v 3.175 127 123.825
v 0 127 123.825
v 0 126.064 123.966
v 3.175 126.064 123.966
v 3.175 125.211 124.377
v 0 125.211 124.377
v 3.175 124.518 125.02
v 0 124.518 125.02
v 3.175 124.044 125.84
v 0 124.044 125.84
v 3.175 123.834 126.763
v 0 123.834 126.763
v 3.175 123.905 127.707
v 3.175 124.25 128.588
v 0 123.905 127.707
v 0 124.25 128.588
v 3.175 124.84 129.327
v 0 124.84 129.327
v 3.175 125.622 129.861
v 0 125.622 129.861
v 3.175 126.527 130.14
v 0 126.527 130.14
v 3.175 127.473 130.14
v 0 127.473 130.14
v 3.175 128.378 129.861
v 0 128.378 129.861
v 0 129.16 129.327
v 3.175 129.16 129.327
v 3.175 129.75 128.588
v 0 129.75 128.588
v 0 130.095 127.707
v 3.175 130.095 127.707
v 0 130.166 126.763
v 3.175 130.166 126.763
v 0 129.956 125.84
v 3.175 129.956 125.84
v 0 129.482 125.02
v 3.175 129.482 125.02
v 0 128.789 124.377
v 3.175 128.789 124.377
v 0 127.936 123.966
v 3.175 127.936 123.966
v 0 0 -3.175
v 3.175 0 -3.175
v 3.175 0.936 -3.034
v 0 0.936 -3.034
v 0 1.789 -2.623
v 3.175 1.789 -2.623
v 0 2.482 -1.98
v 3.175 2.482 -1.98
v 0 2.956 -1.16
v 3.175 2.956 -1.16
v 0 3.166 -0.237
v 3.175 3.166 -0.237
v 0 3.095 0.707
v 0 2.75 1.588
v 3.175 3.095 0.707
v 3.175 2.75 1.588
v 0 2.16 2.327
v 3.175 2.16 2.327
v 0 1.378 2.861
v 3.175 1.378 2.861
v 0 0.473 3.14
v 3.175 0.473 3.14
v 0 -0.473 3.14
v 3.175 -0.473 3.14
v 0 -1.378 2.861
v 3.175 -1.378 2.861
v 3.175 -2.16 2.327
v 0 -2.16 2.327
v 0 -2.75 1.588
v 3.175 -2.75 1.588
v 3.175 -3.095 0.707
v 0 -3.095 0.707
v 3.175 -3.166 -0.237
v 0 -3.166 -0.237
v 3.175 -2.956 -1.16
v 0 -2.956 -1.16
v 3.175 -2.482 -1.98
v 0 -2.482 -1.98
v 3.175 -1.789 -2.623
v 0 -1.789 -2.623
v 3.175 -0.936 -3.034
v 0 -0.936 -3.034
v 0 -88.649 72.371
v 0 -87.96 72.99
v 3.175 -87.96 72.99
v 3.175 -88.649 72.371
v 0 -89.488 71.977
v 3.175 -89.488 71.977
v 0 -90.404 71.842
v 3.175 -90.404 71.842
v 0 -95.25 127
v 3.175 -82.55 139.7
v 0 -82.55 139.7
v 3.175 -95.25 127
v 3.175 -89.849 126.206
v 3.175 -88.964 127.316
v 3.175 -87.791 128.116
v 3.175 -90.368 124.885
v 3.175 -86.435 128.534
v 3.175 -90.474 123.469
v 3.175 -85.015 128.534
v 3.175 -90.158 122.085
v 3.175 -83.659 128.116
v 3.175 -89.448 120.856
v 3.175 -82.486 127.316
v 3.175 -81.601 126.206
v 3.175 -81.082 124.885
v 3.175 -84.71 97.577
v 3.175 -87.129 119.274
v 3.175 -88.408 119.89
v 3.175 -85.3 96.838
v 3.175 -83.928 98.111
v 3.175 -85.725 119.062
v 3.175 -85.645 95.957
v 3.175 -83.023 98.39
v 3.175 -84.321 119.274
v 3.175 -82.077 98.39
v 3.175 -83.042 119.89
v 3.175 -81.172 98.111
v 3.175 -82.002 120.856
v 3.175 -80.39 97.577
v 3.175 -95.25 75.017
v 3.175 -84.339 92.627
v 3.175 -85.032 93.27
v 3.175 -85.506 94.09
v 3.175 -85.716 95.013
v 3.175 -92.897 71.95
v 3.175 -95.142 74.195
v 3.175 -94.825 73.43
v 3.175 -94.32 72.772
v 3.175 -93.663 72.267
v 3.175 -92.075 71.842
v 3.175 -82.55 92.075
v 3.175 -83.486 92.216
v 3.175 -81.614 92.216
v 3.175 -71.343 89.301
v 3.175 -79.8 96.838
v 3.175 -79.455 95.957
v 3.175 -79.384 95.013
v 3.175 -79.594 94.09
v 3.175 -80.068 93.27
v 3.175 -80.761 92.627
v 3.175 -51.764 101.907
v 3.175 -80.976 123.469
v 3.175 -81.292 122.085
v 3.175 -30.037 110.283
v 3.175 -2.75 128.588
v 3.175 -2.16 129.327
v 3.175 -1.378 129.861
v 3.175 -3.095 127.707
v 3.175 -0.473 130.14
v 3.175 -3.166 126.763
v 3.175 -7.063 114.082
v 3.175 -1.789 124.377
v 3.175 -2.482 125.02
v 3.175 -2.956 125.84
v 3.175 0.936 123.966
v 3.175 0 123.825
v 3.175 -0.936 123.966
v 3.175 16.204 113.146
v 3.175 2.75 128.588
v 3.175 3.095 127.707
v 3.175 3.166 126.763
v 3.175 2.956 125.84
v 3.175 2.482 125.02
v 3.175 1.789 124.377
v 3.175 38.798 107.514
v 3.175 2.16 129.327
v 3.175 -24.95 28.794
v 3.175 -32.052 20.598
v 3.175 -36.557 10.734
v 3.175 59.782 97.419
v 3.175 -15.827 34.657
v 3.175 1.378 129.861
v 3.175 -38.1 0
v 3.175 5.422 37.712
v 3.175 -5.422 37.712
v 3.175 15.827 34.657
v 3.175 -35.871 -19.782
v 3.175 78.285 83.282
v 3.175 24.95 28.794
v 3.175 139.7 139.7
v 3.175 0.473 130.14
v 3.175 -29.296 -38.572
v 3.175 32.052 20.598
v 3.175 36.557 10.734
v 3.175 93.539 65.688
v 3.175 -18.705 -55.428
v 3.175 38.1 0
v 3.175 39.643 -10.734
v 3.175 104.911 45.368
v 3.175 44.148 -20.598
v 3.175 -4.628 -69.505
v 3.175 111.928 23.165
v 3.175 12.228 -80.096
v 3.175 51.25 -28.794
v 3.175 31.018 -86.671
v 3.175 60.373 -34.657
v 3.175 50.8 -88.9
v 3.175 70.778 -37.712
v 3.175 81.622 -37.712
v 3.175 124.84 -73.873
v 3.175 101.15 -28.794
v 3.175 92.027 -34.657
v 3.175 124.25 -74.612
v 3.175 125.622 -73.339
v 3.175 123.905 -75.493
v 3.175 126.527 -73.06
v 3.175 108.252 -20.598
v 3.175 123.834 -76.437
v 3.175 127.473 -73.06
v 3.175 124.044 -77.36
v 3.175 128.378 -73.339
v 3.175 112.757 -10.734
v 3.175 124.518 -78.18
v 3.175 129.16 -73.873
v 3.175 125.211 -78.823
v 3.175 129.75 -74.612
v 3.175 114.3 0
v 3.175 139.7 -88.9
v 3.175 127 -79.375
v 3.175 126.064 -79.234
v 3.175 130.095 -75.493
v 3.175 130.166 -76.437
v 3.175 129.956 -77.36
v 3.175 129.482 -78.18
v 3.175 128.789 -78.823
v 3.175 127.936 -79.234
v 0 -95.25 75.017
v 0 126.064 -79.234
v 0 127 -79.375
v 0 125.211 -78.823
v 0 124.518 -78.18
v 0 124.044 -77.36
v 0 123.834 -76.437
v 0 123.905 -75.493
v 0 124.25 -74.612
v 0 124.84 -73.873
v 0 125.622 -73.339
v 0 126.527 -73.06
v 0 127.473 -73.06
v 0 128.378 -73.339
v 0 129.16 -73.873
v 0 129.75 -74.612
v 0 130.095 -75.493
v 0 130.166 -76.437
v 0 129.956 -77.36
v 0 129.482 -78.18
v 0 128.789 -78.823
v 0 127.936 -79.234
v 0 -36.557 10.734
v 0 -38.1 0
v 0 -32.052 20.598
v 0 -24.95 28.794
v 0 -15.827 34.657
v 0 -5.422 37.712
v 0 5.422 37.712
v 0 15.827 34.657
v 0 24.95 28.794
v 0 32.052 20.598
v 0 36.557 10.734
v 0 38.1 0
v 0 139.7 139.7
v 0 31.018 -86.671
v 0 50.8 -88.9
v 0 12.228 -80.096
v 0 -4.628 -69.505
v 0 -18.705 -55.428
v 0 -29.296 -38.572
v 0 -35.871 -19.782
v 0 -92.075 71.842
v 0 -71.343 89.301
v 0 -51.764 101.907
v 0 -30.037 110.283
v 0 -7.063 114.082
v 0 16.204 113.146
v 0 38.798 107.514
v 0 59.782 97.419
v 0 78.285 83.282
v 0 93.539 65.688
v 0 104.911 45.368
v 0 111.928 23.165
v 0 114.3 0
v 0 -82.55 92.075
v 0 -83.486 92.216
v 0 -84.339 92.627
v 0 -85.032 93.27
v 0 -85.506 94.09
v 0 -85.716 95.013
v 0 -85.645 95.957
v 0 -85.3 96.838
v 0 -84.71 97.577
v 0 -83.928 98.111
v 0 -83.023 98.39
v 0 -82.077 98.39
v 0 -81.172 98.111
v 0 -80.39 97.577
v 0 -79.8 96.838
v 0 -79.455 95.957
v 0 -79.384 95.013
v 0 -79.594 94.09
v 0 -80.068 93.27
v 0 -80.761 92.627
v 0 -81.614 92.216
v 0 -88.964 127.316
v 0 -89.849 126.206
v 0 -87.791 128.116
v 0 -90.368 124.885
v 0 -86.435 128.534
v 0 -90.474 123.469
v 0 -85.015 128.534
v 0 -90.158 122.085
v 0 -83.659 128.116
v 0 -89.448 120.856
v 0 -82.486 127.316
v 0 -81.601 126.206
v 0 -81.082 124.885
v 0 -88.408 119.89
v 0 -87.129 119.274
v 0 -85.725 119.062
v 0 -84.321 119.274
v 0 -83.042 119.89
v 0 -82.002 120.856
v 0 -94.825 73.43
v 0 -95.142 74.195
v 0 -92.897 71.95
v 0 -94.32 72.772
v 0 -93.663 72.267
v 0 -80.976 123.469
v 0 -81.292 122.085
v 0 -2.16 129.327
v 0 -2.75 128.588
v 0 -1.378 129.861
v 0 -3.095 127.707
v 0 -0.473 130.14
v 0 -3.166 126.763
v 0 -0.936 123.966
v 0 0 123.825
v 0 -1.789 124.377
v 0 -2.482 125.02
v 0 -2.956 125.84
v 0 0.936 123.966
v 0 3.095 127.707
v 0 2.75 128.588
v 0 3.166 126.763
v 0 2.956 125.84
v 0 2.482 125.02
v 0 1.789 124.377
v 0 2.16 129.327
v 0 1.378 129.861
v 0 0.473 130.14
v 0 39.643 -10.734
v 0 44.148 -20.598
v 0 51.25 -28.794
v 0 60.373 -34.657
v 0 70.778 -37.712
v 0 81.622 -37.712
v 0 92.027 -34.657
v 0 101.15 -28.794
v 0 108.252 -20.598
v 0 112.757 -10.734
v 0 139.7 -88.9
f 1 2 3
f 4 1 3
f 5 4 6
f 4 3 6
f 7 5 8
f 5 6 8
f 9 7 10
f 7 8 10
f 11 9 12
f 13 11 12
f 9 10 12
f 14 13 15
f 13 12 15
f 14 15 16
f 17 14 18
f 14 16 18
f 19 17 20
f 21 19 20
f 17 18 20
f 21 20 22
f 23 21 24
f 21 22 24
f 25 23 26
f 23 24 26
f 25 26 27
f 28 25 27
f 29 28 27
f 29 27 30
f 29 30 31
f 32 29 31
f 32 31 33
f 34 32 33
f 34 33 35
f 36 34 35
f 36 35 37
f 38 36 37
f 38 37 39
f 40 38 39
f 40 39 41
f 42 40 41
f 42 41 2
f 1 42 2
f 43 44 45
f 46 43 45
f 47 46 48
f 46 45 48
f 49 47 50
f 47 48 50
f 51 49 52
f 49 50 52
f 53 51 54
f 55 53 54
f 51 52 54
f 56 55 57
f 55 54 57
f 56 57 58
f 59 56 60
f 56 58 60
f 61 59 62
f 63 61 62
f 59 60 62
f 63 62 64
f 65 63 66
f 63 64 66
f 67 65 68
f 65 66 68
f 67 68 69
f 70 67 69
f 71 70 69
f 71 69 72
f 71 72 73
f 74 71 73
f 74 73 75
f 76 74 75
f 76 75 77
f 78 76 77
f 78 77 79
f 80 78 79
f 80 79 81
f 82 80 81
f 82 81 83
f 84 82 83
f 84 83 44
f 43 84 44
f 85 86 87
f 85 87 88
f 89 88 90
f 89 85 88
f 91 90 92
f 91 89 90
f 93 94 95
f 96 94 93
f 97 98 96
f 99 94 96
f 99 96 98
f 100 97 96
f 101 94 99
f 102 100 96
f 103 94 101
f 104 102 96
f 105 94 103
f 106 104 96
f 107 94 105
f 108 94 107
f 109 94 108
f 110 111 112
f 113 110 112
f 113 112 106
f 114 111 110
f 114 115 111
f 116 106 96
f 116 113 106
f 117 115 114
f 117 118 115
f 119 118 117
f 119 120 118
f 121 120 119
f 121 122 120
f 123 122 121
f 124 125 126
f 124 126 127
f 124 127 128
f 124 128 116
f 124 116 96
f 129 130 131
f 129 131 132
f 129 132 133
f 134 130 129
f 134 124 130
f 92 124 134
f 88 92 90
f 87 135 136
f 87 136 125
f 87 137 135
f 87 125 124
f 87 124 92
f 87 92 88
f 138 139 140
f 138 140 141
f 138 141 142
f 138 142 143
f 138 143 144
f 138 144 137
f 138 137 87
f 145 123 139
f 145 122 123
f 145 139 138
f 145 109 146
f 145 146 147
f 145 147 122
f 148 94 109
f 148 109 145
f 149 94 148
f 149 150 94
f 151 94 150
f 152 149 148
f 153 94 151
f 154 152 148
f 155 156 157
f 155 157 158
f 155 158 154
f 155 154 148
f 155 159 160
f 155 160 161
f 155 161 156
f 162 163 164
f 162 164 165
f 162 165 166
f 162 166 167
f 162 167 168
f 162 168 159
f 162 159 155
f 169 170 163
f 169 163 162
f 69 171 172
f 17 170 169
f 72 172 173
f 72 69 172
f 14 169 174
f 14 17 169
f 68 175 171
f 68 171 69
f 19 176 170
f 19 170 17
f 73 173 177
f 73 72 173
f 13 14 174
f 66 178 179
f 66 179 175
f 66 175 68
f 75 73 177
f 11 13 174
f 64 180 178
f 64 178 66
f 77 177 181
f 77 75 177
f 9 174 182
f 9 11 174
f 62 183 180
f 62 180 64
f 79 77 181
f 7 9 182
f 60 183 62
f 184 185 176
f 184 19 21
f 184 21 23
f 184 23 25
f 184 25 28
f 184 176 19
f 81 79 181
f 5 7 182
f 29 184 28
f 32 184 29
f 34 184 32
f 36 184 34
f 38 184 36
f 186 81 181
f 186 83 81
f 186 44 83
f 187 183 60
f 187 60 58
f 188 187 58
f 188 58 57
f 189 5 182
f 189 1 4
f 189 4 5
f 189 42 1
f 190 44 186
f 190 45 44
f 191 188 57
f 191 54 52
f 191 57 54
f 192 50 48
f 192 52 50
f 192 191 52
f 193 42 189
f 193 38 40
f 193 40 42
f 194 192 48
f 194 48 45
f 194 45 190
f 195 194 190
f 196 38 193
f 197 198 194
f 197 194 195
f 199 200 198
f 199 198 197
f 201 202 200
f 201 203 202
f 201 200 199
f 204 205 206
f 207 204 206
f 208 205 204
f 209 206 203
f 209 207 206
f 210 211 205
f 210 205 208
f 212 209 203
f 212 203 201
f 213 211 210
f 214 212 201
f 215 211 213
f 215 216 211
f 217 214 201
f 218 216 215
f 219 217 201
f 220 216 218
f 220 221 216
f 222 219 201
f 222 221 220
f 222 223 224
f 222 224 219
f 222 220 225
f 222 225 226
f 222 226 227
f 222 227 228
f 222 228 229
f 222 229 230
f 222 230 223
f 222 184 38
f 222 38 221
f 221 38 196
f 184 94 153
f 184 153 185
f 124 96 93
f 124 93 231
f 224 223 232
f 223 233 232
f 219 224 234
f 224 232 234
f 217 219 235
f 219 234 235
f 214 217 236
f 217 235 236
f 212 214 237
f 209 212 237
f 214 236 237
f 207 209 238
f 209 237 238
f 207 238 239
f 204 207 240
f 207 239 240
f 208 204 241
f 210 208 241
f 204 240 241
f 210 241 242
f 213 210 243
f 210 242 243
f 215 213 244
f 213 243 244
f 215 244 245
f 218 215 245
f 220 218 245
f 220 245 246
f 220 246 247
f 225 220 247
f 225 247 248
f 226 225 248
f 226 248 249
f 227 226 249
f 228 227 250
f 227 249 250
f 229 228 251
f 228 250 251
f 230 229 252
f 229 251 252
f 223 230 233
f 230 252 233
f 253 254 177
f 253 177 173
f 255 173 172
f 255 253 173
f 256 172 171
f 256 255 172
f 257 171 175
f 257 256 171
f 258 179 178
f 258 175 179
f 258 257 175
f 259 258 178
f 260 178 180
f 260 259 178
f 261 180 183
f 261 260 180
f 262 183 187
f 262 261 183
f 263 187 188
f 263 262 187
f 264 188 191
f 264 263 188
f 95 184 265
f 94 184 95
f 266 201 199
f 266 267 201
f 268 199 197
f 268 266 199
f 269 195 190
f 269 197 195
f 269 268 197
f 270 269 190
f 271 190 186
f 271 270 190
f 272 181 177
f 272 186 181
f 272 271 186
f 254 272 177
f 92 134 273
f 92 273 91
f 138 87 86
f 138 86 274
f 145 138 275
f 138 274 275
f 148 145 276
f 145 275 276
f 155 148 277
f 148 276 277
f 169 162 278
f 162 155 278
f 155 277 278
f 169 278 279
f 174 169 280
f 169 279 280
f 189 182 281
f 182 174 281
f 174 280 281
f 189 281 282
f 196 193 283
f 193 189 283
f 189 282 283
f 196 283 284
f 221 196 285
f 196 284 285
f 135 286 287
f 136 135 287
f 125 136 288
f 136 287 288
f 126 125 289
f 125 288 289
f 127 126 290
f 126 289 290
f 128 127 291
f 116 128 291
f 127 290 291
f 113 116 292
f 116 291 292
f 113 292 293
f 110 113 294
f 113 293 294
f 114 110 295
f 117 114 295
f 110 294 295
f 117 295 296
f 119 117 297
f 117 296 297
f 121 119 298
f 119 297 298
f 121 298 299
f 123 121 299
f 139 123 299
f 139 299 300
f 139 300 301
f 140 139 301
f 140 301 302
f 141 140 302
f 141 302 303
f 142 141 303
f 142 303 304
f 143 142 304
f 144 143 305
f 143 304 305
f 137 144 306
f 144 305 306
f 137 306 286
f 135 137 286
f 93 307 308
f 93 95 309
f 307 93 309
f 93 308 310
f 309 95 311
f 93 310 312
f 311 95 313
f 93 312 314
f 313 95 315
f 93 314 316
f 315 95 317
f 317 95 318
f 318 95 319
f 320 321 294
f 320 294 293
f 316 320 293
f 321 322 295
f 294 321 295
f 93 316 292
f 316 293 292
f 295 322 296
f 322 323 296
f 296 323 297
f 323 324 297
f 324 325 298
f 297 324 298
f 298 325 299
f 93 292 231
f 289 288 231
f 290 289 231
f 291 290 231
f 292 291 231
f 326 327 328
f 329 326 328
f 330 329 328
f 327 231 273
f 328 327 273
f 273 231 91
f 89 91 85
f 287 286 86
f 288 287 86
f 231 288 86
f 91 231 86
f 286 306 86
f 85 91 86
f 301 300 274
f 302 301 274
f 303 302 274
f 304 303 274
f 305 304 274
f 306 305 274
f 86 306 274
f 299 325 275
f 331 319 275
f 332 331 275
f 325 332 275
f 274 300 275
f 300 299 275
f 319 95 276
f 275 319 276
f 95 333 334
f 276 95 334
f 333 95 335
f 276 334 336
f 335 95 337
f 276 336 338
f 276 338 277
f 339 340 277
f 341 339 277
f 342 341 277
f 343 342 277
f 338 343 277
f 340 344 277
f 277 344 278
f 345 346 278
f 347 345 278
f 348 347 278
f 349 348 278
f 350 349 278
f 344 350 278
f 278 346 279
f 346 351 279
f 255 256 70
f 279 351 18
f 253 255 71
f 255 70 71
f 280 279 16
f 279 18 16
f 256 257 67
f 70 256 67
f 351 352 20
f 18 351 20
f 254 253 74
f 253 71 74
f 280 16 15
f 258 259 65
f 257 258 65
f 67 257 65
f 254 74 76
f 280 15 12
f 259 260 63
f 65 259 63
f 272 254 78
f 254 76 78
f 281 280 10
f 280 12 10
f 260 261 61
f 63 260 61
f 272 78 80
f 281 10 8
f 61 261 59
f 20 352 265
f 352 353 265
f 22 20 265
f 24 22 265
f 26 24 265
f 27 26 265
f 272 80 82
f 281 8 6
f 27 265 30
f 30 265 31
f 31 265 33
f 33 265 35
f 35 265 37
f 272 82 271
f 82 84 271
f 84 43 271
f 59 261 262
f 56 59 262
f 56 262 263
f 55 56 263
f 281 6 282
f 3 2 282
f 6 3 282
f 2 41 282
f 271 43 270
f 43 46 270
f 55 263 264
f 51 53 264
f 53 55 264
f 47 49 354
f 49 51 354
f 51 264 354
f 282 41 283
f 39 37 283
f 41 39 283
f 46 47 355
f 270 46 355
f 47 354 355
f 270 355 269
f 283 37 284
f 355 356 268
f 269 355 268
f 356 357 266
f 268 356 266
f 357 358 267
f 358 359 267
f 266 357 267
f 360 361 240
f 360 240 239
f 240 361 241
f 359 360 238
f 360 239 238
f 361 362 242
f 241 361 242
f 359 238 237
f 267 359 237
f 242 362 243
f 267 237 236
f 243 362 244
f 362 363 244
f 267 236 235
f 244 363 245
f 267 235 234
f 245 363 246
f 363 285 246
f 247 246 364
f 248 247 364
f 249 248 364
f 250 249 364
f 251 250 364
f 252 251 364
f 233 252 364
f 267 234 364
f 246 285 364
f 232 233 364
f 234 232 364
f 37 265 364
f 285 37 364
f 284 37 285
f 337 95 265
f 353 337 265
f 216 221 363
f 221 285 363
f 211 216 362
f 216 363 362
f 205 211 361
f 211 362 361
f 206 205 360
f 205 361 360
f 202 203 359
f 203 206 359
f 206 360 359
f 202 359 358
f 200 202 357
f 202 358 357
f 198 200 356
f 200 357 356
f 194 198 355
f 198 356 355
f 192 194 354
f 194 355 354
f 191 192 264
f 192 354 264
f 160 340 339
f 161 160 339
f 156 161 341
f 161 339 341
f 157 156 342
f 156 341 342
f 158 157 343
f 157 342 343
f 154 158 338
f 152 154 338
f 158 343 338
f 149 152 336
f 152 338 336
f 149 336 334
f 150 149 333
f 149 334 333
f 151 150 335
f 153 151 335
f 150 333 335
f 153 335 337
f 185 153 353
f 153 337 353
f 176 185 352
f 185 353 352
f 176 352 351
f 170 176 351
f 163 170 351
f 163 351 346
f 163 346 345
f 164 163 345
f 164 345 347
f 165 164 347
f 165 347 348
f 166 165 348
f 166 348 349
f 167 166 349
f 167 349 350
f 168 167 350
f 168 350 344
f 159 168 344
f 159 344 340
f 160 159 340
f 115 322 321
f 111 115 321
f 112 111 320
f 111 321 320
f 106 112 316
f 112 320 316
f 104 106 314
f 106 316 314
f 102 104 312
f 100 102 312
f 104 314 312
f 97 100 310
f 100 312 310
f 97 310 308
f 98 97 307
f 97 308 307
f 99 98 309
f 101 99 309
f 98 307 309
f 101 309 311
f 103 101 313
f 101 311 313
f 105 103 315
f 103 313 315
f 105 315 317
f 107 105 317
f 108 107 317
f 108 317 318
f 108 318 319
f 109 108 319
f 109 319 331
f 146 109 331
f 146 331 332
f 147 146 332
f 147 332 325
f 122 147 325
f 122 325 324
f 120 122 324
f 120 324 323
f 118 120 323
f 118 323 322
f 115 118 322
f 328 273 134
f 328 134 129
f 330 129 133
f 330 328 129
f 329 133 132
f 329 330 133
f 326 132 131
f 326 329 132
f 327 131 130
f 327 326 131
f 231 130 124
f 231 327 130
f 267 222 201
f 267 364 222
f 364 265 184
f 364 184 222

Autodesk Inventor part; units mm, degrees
ref_plane "YZ Plane" through (0, 0, 0) normal (1, 0, 0) x (0, 1, 0)
ref_plane "XZ Plane" through (0, 0, 0) normal (0, 1, 0) x (-1, 0, 0)
ref_plane "XY Plane" through (0, 0, 0) normal (0, 0, 1) x (1, 0, 0)
sketch "Sketch1" plane through (0, 0, 0) normal (1, 0, 0) x (0, 1, 0)
  circle A0 centre (0, 0) radius 50.8 construction
  circle A1 centre (82.55, 0) radius 31.75 construction
  circle A2 centre (-82.55, 0) radius 31.75 construction
  circle A3 centre (0, 0) radius 114.3 construction
  circle A4 centre (0, 0) radius 38.1 construction
  arc A5 (38.1, 0) -> (114.3, 0) centre (76.2, 0) ccw construction
  arc A6 (-38.1, 0) -> (139.7, 0) centre (50.8, 0) ccw construction
  line L0 (50.8, -88.9) -> (139.7, -88.9) construction
  line L1 (139.7, -88.9) -> (139.7, 0) construction
  line L2 (139.7, 0) -> (-101.6, 0) construction
  line L3 (-101.6, 0) -> (-101.6, 139.7) construction
  line L4 (-101.6, 139.7) -> (139.7, 139.7) construction
  line L5 (139.7, 139.7) -> (139.7, 0) construction
  arc A7 (11.0716, 139.7) -> (-101.6, 96.52) centre (0, 0) ccw construction
  line L6 (-101.6, 139.7) -> (-101.6, 63.1817) construction
  line L7 (-101.6, 63.1817) -> (-95.25, 63.1817) construction
  arc A8 (-11.0716, 139.7) -> (-101.6, 96.52) centre (0, 0) ccw
  line L8 (-11.0716, 139.7) -> (139.7, 139.7)
  line L9 (139.7, 139.7) -> (139.7, -88.9)
  line L10 (139.7, -88.9) -> (50.8, -88.9)
  arc A9 (-38.1, 0) -> (50.8, -88.9) centre (50.8, 0) ccw
  arc A10 (38.1, 0) -> (-38.1, 0) centre (0, 0) ccw
  arc A11 (38.1, 0) -> (114.3, 0) centre (76.2, 0) ccw
  arc A12 (114.3, 0) -> (-95.25, 63.1817) centre (0, 0) ccw
  line L11 (-95.25, 63.1817) -> (-101.6, 63.1817)
  line L12 (-101.6, 96.52) -> (-101.6, 63.1817)
  dimension "d1" = 63.5
  dimension "d0" = 101.6
  dimension "d2" = 63.5
  dimension "d3" = 82.55
  dimension "d4" = 82.55
  dimension "d5" = 0
  dimension "d6" = 0
  dimension "d7" = 228.6
  dimension "d8" = 76.2
  dimension "d9" = 76.2
  dimension "d10" = 177.8
  dimension "d11" = 88.9
  dimension "d12" = 139.7
  dimension "d13" = 0
  dimension "d14" = 241.3
  dimension "d15" = 139.7
  dimension "d16" = 0
  dimension "d76" = 6.35
  dimension "d77" = 43.18
extrude "Extrusion1" add sketch "Sketch1" along normal blind 3.175
sketch "Sketch2" plane through (3.175, 0, 0) normal (1, 0, 0) x (0, 0, -1)
  arc A0 (0, 38.1) -> (0, -38.1) centre (0, 0) ccw projected
  arc A1 (0, -38.1) -> (88.9, 50.8) centre (0, 50.8) ccw projected
  line L0 (88.9, 50.8) -> (88.9, 139.7) projected
  line L1 (88.9, 139.7) -> (-139.7, 139.7) projected
  line L2 (-139.7, 139.7) -> (-139.7, -11.0716) projected
  arc A2 (-139.7, -11.0716) -> (-96.52, -101.6) centre (0, 0) ccw projected
  line L3 (-96.52, -101.6) -> (-63.1817, -101.6) projected
  line L4 (-63.1817, -101.6) -> (-63.1817, -95.25) projected
  arc A3 (0, 114.3) -> (-63.1817, -95.25) centre (0, 0) ccw projected
  arc A4 (0, 38.1) -> (0, 114.3) centre (0, 76.2) ccw projected
  line L5 (-63.1817, -101.6) -> (-139.3817, -101.6)
  line L6 (-139.3817, -101.6) -> (-139.3817, -95.25)
  line L7 (-139.3817, -95.25) -> (-63.1817, -95.25)
  line L8 (-63.1817, -95.25) -> (-63.1817, -101.6)
  arc A5 (0, 114.3) -> (-63.1817, -95.25) centre (0, 0) ccw projected
  line L9 (-63.1817, -101.6) -> (-71.842, -101.6)
  line L10 (-71.842, -101.6) -> (-71.842, -88.9)
  line L11 (-71.842, -88.9) -> (-63.1817, -88.9)
  line L12 (-63.1817, -88.9) -> (-63.1817, -101.6)
  point P0 (0, 0)
  dimension "d24" = 76.2
  dimension "d25" = 6.35
  dimension "d26" = 12.7
extrude "Extrusion2" cut sketch "Sketch2" against normal blind 3.175 contours L11 L12 A3 | A3 L7 L10 | L4 L3 L10 L7 | L10 L3 A2 L7 | A2 L5 L6 L7
sketch "Sketch3" plane through (3.175, 0, 0) normal (1, 0, 0) x (0, 0, -1)
  line L0 (-102.7916, -95.25) -> (-71.842, -95.25) projected
  line L1 (-71.842, -95.25) -> (-71.842, -88.9) projected
  arc A0 (0, 114.3) -> (-71.842, -88.9) centre (0, 0) ccw projected
  arc A1 (0, 38.1) -> (0, 114.3) centre (0, 76.2) ccw projected
  arc A2 (0, 38.1) -> (0, -38.1) centre (0, 0) ccw projected
  arc A3 (0, -38.1) -> (88.9, 50.8) centre (0, 50.8) ccw projected
  line L2 (88.9, 50.8) -> (88.9, 139.7) projected
  line L3 (88.9, 139.7) -> (-139.7, 139.7) projected
  line L4 (-139.7, 139.7) -> (-139.7, -11.0716) projected
  arc A4 (-139.7, -11.0716) -> (-102.7916, -95.25) centre (0, 0) ccw projected
  point P0 (0, 0)
  point P1 (-127, 127)
  point P2 (76.2, 127)
  point P3 (-95.25, -82.55)
  point P4 (-127, 0)
  dimension "d29" = 12.7
  dimension "d30" = 12.7
  dimension "d31" = 12.7
  dimension "d32" = 12.7
  dimension "d33" = 12.7
  dimension "d34" = 139.7
  dimension "d35" = 95.25
  dimension "d36" = 82.55
hole "Hole1" at (3.175, 127, 127) at (3.175, 127, -76.2) at (3.175, -82.55, 95.25) at (3.175, 0, 127) direction (-1, 0, 0) diameter 6.35 end through all
sketch "Sketch4" plane through (3.175, 0, 0) normal (1, 0, 0) x (0, 0, -1)
  circle A0 centre (-95.25, -82.55) radius 3.175 projected
  circle A1 centre (-127, 127) radius 3.175 projected
  circle A2 centre (76.2, 127) radius 3.175 projected
  circle A3 centre (-127, 0) radius 3.175 projected
  line L0 (-102.7916, -95.25) -> (-71.842, -95.25) projected
  line L1 (-71.842, -95.25) -> (-71.842, -88.9) projected
  arc A4 (0, 114.3) -> (-71.842, -88.9) centre (0, 0) ccw projected
  arc A5 (0, 38.1) -> (0, 114.3) centre (0, 76.2) ccw projected
  arc A6 (0, 38.1) -> (0, -38.1) centre (0, 0) ccw projected
  arc A7 (0, -38.1) -> (88.9, 50.8) centre (0, 50.8) ccw projected
  line L2 (88.9, 50.8) -> (88.9, 139.7) projected
  line L3 (88.9, 139.7) -> (-139.7, 139.7) projected
  line L4 (-139.7, 139.7) -> (-139.7, -11.0716) projected
  arc A8 (-139.7, -11.0716) -> (-102.7916, -95.25) centre (0, 0) ccw projected
  circle A9 centre (0, 0) radius 3.175
  point P0 (0, 0)
  dimension "d55" = 6.35
sketch "Sketch5" plane through (3.175, 0, 0) normal (1, 0, 0) x (0, 0, -1)
  circle A0 centre (-95.25, -82.55) radius 3.175 projected
  circle A1 centre (-127, 127) radius 3.175 projected
  circle A2 centre (76.2, 127) radius 3.175 projected
  circle A3 centre (-127, 0) radius 3.175 projected
  line L0 (-102.7916, -95.25) -> (-71.842, -95.25) projected
  line L1 (-71.842, -95.25) -> (-71.842, -88.9) projected
  arc A4 (0, 114.3) -> (-71.842, -88.9) centre (0, 0) ccw projected
  arc A5 (0, 38.1) -> (0, 114.3) centre (0, 76.2) ccw projected
  arc A6 (0, 38.1) -> (0, -38.1) centre (0, 0) ccw projected
  arc A7 (0, -38.1) -> (88.9, 50.8) centre (0, 50.8) ccw projected
  line L2 (88.9, 50.8) -> (88.9, 139.7) projected
  line L3 (88.9, 139.7) -> (-139.7, 139.7) projected
  line L4 (-139.7, 139.7) -> (-139.7, -11.0716) projected
  arc A8 (-139.7, -11.0716) -> (-102.7916, -95.25) centre (0, 0) ccw projected
  line L5 (-139.7, -11.0716) -> (-139.7, -95.25) construction
  line L6 (-139.7, -95.25) -> (-102.7916, -95.25) construction
  line L7 (-139.7, -95.25) -> (-127, -95.25) construction
  line L8 (-127, -95.25) -> (-127, -82.55) construction
  line L9 (-127, -82.55) -> (-139.7, -82.55) construction
  line L10 (-139.7, -82.55) -> (-139.7, -95.25) construction
  line L11 (-139.7, -11.0716) -> (-139.7, -82.55)
  line L12 (-139.7, -82.55) -> (-127, -95.25)
  line L13 (-127, -95.25) -> (-102.7916, -95.25)
  point P0 (0, 0)
  dimension "d60" = 12.7
  dimension "d61" = 12.7
extrude "Extrusion4" add sketch "Sketch5" against normal blind 3.175 contours L13 L12 L11 A8
sketch "Sketch6" plane through (3.175, 0, 0) normal (1, 0, 0) x (0, 0, -1)
  circle A0 centre (-95.25, -82.55) radius 3.175 projected
  circle A1 centre (-127, 127) radius 3.175 projected
  circle A2 centre (76.2, 127) radius 3.175 projected
  circle A3 centre (-127, 0) radius 3.175 projected
  line L0 (-127, -95.25) -> (-71.842, -95.25) projected
  line L1 (-71.842, -95.25) -> (-71.842, -88.9) projected
  arc A4 (0, 114.3) -> (-71.842, -88.9) centre (0, 0) ccw projected
  arc A5 (0, 38.1) -> (0, 114.3) centre (0, 76.2) ccw projected
  arc A6 (0, 38.1) -> (0, -38.1) centre (0, 0) ccw projected
  arc A7 (0, -38.1) -> (88.9, 50.8) centre (0, 50.8) ccw projected
  line L2 (88.9, 50.8) -> (88.9, 139.7) projected
  line L3 (88.9, 139.7) -> (-139.7, 139.7) projected
  line L4 (-139.7, 139.7) -> (-139.7, -82.55) projected
  line L5 (-139.7, -82.55) -> (-127, -95.25) projected
  point P0 (0, 0)
  point P1 (-123.825, -85.725)
  dimension "d64" = 15.875
  dimension "d65" = 9.525
hole "Hole3" at (3.175, -85.725, 123.825) direction (-1, 0, 0) diameter 9.525 end through all
fillet "Fillet1" radius 3.175 2 edges at (1.5875, -95.25, 71.842) (1.5875, -88.9, 71.842)
extrude "Extrusion5" cut sketch "Sketch4" against normal blind 25.4 contours A9
properties part number "rail" material "Aluminum 6061"
